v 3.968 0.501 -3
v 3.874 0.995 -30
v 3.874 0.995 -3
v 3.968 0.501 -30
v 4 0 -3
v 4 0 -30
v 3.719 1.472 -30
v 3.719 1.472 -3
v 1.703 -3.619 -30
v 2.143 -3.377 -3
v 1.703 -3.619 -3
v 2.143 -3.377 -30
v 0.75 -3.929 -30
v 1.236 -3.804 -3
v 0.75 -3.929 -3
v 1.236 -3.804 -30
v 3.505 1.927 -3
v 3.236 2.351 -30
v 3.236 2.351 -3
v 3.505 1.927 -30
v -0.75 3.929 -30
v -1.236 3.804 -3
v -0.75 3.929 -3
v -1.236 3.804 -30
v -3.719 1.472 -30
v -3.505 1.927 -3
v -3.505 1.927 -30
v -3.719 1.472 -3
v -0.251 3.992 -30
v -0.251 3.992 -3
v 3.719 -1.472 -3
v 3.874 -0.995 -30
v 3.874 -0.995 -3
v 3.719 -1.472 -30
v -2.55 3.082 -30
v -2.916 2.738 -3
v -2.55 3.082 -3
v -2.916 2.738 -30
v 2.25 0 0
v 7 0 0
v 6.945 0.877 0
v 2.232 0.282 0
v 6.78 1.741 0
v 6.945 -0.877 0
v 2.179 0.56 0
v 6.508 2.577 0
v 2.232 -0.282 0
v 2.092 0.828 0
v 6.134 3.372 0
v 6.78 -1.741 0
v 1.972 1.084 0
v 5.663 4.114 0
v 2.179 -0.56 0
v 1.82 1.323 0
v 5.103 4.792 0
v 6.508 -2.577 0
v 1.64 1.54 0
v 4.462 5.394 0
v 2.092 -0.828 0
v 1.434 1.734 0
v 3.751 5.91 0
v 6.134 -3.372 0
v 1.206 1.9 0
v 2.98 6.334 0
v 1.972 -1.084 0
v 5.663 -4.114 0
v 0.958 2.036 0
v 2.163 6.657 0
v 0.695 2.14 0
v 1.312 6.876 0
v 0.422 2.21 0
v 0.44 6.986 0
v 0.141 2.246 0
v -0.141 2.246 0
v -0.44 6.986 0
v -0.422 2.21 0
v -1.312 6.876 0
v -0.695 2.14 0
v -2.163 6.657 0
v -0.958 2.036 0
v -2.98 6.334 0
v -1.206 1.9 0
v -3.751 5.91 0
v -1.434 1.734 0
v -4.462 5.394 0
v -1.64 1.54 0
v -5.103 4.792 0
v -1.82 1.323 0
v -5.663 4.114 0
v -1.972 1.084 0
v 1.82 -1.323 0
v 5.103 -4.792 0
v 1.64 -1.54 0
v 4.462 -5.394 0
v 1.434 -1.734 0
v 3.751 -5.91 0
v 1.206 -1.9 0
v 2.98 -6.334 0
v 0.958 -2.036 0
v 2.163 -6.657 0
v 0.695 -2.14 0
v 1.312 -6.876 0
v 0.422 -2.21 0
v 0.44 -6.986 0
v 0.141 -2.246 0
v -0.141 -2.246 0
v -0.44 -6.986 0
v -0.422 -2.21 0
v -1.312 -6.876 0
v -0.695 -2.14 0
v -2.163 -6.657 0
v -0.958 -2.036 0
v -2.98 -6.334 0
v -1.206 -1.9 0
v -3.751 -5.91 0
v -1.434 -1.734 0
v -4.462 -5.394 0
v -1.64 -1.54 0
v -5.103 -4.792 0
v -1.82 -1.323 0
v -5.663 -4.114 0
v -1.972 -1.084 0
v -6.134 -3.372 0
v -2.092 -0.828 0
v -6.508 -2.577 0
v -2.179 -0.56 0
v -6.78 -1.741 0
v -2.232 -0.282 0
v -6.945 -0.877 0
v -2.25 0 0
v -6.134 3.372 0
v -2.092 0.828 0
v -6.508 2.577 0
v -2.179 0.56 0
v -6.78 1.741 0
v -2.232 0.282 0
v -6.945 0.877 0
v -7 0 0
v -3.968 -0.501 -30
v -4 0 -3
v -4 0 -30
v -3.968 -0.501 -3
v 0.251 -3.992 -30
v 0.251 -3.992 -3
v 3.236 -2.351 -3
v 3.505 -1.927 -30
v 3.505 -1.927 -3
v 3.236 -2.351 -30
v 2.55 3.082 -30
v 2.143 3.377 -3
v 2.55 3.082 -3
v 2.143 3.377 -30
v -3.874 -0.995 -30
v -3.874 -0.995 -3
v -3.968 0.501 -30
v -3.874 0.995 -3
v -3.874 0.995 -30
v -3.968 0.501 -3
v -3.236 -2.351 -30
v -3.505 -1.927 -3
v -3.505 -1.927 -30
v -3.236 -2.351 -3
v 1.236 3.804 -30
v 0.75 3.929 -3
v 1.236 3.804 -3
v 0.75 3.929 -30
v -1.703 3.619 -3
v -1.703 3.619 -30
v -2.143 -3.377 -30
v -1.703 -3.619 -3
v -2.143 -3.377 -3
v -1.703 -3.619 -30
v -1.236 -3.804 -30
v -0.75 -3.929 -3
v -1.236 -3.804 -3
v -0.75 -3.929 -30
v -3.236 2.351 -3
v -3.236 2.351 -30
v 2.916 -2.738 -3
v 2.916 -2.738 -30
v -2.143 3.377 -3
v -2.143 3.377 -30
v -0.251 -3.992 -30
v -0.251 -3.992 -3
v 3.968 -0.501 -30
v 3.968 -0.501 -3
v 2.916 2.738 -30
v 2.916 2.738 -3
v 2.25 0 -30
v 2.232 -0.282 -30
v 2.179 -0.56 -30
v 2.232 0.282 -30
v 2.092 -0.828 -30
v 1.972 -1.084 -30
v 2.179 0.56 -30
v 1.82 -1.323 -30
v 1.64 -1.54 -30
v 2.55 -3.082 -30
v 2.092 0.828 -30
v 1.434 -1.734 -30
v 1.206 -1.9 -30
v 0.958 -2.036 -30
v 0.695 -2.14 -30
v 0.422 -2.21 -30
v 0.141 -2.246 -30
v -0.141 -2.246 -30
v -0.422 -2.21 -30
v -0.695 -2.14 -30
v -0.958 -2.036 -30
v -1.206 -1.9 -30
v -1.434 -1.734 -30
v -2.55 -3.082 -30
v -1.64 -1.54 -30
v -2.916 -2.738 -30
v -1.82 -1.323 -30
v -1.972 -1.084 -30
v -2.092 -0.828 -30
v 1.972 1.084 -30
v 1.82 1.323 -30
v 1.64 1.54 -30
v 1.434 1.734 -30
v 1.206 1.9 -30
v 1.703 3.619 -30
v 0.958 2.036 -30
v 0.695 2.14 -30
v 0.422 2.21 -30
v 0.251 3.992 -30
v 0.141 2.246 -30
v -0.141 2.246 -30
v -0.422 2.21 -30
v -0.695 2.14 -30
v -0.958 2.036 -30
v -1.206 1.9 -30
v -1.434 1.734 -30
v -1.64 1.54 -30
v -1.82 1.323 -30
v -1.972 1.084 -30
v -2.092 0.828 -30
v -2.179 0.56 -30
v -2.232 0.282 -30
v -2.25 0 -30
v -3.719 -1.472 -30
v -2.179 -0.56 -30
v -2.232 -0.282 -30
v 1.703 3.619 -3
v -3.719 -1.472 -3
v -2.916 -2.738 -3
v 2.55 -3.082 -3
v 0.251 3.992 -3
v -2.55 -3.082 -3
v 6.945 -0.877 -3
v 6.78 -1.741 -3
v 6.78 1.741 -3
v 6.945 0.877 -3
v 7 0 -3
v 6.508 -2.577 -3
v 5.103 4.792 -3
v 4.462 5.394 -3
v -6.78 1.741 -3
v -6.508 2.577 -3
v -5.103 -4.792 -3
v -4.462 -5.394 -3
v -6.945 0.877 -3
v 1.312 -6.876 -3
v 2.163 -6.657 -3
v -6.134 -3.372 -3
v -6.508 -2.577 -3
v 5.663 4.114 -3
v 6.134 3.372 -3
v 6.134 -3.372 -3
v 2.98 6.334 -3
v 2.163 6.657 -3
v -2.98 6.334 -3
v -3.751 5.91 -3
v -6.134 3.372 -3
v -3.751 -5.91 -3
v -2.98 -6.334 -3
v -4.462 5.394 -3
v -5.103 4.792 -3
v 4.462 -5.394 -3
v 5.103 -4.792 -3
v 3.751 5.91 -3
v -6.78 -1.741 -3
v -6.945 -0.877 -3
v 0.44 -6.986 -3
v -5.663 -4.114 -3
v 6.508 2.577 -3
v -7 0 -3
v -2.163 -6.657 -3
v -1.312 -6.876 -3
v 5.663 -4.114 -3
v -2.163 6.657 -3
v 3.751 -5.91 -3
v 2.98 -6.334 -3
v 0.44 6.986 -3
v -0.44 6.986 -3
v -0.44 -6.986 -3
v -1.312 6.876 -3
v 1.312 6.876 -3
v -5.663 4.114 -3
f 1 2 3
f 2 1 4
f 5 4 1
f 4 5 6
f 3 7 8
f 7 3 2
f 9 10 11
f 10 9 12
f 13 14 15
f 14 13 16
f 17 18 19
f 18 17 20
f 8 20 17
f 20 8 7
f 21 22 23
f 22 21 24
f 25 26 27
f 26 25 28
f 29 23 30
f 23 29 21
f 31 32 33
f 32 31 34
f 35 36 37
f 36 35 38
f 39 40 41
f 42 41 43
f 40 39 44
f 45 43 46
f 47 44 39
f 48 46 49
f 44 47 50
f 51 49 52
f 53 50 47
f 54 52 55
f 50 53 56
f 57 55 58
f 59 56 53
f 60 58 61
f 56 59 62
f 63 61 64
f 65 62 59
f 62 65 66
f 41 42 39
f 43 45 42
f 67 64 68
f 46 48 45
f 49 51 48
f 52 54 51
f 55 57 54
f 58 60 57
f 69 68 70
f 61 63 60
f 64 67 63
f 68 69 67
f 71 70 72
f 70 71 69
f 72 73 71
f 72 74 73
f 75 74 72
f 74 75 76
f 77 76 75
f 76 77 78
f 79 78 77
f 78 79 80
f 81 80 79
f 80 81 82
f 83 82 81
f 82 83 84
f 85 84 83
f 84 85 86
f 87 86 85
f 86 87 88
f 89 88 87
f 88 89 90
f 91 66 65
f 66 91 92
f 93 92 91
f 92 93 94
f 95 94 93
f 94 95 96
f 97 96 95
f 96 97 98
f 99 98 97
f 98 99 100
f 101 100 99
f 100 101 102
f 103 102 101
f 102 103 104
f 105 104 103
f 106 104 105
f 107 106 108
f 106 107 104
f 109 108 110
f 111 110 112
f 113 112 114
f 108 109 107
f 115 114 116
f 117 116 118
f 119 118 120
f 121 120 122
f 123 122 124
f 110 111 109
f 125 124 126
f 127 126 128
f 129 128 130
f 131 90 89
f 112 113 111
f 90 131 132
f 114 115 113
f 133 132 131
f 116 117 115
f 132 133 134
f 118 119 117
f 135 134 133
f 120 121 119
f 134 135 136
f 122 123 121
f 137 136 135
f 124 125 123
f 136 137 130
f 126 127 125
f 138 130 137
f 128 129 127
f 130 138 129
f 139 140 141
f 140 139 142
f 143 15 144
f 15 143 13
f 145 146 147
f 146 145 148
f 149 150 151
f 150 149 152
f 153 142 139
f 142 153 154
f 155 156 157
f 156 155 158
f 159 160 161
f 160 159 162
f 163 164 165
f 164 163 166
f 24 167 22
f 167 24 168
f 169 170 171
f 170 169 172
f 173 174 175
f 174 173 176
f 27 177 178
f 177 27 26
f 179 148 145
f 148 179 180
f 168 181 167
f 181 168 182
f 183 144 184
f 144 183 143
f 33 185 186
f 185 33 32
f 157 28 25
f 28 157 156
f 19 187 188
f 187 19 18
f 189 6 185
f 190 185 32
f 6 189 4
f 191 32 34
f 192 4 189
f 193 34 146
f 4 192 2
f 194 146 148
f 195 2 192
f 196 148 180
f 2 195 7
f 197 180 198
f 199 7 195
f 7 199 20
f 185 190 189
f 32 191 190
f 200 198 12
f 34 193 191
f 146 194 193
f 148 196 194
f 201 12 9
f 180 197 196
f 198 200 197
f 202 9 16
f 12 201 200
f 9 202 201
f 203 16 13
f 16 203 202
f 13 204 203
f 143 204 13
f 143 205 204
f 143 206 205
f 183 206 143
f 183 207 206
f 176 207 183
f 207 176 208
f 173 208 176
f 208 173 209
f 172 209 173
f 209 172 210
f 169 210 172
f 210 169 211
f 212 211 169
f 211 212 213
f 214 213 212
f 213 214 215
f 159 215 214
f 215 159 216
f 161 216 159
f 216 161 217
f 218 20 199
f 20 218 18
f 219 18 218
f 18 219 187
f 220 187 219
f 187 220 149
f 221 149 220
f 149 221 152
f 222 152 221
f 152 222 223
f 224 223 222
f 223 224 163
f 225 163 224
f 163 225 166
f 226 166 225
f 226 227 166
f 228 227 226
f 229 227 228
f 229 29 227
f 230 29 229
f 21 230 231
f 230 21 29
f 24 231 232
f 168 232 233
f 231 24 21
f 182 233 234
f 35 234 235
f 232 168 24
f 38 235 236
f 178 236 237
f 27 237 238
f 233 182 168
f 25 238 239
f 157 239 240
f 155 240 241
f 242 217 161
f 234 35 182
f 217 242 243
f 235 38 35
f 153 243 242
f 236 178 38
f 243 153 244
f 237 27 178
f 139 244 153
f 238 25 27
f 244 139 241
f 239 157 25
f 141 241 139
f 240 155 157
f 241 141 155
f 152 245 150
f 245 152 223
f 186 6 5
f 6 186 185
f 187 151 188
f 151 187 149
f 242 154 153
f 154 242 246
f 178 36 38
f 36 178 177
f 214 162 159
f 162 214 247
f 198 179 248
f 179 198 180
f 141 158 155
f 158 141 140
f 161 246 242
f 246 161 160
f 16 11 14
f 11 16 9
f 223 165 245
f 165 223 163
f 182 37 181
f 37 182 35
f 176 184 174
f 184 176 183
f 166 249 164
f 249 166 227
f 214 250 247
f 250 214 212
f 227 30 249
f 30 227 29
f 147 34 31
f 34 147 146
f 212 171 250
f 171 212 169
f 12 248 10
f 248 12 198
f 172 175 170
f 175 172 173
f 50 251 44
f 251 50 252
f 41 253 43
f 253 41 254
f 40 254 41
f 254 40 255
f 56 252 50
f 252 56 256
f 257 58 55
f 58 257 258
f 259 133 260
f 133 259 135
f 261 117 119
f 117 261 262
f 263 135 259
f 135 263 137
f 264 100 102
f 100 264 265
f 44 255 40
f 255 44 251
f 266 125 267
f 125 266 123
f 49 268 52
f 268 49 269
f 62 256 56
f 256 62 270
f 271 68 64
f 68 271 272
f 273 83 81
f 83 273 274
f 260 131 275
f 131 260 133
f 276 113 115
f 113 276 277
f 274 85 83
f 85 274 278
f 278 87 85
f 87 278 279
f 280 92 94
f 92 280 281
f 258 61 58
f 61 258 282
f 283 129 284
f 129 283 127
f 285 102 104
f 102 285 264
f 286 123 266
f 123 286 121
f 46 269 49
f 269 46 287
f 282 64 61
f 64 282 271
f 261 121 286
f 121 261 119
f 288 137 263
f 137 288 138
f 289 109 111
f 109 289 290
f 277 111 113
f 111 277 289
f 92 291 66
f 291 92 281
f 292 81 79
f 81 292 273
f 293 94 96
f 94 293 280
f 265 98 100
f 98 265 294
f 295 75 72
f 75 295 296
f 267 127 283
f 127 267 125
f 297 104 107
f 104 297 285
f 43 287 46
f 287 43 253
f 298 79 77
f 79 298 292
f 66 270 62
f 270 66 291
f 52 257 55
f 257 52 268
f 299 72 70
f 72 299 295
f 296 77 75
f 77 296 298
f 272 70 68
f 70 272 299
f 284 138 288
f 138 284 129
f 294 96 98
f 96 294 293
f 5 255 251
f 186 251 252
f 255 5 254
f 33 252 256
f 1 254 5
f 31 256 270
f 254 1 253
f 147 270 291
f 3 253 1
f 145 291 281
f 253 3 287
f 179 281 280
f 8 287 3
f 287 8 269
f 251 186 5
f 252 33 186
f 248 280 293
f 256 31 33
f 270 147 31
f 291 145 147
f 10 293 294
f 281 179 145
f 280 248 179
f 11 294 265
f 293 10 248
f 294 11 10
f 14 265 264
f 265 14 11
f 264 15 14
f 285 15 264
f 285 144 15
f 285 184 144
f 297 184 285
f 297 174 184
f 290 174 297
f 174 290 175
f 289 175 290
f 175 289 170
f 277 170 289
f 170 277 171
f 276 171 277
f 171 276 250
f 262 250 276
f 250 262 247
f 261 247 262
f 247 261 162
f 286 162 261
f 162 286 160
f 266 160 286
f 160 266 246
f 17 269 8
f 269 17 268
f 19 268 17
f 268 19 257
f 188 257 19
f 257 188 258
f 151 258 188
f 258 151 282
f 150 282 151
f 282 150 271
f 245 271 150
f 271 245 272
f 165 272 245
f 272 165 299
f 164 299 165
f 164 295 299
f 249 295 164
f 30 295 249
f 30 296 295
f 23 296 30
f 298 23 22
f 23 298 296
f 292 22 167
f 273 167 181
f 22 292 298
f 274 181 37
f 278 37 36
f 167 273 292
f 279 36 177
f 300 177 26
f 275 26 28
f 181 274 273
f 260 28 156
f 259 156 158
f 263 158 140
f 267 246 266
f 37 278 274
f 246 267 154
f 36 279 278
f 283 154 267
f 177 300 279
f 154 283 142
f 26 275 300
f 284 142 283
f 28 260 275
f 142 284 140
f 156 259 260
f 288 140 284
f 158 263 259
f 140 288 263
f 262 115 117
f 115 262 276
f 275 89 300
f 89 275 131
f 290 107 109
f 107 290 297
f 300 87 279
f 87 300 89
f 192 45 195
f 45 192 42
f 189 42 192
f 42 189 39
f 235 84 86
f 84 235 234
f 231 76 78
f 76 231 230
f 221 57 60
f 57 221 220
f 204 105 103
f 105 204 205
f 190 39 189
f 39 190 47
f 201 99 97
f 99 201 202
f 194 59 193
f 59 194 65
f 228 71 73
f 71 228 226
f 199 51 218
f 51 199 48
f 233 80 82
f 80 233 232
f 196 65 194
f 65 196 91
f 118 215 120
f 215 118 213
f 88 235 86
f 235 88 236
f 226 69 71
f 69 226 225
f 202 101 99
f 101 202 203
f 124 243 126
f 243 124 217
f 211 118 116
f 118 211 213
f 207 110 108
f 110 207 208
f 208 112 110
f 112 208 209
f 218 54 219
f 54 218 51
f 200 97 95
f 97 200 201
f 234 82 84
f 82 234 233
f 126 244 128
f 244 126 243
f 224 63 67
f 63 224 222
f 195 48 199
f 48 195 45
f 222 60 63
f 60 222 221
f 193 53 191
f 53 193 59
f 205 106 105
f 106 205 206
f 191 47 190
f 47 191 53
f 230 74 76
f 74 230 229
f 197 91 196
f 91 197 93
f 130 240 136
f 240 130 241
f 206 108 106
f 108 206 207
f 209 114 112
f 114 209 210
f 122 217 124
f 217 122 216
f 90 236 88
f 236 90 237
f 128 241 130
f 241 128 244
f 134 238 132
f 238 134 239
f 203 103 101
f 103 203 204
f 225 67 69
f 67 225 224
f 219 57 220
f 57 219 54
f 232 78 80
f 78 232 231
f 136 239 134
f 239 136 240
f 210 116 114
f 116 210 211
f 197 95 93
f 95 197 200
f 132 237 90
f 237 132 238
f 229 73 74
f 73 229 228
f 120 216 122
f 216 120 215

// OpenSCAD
$fn = 50;


difference() {
	union() {
		translate(v = [0, 0, -30.0000000000]) {
			cylinder(h = 30, r = 4.0000000000);
		}
		translate(v = [0, 0, -3.0000000000]) {
			cylinder(h = 3, r = 7.0000000000);
		}
	}
	union() {
		#translate(v = [0, 0, -30]) {
			cylinder(h = 30, r = 2.2500000000);
		}
	}
}
